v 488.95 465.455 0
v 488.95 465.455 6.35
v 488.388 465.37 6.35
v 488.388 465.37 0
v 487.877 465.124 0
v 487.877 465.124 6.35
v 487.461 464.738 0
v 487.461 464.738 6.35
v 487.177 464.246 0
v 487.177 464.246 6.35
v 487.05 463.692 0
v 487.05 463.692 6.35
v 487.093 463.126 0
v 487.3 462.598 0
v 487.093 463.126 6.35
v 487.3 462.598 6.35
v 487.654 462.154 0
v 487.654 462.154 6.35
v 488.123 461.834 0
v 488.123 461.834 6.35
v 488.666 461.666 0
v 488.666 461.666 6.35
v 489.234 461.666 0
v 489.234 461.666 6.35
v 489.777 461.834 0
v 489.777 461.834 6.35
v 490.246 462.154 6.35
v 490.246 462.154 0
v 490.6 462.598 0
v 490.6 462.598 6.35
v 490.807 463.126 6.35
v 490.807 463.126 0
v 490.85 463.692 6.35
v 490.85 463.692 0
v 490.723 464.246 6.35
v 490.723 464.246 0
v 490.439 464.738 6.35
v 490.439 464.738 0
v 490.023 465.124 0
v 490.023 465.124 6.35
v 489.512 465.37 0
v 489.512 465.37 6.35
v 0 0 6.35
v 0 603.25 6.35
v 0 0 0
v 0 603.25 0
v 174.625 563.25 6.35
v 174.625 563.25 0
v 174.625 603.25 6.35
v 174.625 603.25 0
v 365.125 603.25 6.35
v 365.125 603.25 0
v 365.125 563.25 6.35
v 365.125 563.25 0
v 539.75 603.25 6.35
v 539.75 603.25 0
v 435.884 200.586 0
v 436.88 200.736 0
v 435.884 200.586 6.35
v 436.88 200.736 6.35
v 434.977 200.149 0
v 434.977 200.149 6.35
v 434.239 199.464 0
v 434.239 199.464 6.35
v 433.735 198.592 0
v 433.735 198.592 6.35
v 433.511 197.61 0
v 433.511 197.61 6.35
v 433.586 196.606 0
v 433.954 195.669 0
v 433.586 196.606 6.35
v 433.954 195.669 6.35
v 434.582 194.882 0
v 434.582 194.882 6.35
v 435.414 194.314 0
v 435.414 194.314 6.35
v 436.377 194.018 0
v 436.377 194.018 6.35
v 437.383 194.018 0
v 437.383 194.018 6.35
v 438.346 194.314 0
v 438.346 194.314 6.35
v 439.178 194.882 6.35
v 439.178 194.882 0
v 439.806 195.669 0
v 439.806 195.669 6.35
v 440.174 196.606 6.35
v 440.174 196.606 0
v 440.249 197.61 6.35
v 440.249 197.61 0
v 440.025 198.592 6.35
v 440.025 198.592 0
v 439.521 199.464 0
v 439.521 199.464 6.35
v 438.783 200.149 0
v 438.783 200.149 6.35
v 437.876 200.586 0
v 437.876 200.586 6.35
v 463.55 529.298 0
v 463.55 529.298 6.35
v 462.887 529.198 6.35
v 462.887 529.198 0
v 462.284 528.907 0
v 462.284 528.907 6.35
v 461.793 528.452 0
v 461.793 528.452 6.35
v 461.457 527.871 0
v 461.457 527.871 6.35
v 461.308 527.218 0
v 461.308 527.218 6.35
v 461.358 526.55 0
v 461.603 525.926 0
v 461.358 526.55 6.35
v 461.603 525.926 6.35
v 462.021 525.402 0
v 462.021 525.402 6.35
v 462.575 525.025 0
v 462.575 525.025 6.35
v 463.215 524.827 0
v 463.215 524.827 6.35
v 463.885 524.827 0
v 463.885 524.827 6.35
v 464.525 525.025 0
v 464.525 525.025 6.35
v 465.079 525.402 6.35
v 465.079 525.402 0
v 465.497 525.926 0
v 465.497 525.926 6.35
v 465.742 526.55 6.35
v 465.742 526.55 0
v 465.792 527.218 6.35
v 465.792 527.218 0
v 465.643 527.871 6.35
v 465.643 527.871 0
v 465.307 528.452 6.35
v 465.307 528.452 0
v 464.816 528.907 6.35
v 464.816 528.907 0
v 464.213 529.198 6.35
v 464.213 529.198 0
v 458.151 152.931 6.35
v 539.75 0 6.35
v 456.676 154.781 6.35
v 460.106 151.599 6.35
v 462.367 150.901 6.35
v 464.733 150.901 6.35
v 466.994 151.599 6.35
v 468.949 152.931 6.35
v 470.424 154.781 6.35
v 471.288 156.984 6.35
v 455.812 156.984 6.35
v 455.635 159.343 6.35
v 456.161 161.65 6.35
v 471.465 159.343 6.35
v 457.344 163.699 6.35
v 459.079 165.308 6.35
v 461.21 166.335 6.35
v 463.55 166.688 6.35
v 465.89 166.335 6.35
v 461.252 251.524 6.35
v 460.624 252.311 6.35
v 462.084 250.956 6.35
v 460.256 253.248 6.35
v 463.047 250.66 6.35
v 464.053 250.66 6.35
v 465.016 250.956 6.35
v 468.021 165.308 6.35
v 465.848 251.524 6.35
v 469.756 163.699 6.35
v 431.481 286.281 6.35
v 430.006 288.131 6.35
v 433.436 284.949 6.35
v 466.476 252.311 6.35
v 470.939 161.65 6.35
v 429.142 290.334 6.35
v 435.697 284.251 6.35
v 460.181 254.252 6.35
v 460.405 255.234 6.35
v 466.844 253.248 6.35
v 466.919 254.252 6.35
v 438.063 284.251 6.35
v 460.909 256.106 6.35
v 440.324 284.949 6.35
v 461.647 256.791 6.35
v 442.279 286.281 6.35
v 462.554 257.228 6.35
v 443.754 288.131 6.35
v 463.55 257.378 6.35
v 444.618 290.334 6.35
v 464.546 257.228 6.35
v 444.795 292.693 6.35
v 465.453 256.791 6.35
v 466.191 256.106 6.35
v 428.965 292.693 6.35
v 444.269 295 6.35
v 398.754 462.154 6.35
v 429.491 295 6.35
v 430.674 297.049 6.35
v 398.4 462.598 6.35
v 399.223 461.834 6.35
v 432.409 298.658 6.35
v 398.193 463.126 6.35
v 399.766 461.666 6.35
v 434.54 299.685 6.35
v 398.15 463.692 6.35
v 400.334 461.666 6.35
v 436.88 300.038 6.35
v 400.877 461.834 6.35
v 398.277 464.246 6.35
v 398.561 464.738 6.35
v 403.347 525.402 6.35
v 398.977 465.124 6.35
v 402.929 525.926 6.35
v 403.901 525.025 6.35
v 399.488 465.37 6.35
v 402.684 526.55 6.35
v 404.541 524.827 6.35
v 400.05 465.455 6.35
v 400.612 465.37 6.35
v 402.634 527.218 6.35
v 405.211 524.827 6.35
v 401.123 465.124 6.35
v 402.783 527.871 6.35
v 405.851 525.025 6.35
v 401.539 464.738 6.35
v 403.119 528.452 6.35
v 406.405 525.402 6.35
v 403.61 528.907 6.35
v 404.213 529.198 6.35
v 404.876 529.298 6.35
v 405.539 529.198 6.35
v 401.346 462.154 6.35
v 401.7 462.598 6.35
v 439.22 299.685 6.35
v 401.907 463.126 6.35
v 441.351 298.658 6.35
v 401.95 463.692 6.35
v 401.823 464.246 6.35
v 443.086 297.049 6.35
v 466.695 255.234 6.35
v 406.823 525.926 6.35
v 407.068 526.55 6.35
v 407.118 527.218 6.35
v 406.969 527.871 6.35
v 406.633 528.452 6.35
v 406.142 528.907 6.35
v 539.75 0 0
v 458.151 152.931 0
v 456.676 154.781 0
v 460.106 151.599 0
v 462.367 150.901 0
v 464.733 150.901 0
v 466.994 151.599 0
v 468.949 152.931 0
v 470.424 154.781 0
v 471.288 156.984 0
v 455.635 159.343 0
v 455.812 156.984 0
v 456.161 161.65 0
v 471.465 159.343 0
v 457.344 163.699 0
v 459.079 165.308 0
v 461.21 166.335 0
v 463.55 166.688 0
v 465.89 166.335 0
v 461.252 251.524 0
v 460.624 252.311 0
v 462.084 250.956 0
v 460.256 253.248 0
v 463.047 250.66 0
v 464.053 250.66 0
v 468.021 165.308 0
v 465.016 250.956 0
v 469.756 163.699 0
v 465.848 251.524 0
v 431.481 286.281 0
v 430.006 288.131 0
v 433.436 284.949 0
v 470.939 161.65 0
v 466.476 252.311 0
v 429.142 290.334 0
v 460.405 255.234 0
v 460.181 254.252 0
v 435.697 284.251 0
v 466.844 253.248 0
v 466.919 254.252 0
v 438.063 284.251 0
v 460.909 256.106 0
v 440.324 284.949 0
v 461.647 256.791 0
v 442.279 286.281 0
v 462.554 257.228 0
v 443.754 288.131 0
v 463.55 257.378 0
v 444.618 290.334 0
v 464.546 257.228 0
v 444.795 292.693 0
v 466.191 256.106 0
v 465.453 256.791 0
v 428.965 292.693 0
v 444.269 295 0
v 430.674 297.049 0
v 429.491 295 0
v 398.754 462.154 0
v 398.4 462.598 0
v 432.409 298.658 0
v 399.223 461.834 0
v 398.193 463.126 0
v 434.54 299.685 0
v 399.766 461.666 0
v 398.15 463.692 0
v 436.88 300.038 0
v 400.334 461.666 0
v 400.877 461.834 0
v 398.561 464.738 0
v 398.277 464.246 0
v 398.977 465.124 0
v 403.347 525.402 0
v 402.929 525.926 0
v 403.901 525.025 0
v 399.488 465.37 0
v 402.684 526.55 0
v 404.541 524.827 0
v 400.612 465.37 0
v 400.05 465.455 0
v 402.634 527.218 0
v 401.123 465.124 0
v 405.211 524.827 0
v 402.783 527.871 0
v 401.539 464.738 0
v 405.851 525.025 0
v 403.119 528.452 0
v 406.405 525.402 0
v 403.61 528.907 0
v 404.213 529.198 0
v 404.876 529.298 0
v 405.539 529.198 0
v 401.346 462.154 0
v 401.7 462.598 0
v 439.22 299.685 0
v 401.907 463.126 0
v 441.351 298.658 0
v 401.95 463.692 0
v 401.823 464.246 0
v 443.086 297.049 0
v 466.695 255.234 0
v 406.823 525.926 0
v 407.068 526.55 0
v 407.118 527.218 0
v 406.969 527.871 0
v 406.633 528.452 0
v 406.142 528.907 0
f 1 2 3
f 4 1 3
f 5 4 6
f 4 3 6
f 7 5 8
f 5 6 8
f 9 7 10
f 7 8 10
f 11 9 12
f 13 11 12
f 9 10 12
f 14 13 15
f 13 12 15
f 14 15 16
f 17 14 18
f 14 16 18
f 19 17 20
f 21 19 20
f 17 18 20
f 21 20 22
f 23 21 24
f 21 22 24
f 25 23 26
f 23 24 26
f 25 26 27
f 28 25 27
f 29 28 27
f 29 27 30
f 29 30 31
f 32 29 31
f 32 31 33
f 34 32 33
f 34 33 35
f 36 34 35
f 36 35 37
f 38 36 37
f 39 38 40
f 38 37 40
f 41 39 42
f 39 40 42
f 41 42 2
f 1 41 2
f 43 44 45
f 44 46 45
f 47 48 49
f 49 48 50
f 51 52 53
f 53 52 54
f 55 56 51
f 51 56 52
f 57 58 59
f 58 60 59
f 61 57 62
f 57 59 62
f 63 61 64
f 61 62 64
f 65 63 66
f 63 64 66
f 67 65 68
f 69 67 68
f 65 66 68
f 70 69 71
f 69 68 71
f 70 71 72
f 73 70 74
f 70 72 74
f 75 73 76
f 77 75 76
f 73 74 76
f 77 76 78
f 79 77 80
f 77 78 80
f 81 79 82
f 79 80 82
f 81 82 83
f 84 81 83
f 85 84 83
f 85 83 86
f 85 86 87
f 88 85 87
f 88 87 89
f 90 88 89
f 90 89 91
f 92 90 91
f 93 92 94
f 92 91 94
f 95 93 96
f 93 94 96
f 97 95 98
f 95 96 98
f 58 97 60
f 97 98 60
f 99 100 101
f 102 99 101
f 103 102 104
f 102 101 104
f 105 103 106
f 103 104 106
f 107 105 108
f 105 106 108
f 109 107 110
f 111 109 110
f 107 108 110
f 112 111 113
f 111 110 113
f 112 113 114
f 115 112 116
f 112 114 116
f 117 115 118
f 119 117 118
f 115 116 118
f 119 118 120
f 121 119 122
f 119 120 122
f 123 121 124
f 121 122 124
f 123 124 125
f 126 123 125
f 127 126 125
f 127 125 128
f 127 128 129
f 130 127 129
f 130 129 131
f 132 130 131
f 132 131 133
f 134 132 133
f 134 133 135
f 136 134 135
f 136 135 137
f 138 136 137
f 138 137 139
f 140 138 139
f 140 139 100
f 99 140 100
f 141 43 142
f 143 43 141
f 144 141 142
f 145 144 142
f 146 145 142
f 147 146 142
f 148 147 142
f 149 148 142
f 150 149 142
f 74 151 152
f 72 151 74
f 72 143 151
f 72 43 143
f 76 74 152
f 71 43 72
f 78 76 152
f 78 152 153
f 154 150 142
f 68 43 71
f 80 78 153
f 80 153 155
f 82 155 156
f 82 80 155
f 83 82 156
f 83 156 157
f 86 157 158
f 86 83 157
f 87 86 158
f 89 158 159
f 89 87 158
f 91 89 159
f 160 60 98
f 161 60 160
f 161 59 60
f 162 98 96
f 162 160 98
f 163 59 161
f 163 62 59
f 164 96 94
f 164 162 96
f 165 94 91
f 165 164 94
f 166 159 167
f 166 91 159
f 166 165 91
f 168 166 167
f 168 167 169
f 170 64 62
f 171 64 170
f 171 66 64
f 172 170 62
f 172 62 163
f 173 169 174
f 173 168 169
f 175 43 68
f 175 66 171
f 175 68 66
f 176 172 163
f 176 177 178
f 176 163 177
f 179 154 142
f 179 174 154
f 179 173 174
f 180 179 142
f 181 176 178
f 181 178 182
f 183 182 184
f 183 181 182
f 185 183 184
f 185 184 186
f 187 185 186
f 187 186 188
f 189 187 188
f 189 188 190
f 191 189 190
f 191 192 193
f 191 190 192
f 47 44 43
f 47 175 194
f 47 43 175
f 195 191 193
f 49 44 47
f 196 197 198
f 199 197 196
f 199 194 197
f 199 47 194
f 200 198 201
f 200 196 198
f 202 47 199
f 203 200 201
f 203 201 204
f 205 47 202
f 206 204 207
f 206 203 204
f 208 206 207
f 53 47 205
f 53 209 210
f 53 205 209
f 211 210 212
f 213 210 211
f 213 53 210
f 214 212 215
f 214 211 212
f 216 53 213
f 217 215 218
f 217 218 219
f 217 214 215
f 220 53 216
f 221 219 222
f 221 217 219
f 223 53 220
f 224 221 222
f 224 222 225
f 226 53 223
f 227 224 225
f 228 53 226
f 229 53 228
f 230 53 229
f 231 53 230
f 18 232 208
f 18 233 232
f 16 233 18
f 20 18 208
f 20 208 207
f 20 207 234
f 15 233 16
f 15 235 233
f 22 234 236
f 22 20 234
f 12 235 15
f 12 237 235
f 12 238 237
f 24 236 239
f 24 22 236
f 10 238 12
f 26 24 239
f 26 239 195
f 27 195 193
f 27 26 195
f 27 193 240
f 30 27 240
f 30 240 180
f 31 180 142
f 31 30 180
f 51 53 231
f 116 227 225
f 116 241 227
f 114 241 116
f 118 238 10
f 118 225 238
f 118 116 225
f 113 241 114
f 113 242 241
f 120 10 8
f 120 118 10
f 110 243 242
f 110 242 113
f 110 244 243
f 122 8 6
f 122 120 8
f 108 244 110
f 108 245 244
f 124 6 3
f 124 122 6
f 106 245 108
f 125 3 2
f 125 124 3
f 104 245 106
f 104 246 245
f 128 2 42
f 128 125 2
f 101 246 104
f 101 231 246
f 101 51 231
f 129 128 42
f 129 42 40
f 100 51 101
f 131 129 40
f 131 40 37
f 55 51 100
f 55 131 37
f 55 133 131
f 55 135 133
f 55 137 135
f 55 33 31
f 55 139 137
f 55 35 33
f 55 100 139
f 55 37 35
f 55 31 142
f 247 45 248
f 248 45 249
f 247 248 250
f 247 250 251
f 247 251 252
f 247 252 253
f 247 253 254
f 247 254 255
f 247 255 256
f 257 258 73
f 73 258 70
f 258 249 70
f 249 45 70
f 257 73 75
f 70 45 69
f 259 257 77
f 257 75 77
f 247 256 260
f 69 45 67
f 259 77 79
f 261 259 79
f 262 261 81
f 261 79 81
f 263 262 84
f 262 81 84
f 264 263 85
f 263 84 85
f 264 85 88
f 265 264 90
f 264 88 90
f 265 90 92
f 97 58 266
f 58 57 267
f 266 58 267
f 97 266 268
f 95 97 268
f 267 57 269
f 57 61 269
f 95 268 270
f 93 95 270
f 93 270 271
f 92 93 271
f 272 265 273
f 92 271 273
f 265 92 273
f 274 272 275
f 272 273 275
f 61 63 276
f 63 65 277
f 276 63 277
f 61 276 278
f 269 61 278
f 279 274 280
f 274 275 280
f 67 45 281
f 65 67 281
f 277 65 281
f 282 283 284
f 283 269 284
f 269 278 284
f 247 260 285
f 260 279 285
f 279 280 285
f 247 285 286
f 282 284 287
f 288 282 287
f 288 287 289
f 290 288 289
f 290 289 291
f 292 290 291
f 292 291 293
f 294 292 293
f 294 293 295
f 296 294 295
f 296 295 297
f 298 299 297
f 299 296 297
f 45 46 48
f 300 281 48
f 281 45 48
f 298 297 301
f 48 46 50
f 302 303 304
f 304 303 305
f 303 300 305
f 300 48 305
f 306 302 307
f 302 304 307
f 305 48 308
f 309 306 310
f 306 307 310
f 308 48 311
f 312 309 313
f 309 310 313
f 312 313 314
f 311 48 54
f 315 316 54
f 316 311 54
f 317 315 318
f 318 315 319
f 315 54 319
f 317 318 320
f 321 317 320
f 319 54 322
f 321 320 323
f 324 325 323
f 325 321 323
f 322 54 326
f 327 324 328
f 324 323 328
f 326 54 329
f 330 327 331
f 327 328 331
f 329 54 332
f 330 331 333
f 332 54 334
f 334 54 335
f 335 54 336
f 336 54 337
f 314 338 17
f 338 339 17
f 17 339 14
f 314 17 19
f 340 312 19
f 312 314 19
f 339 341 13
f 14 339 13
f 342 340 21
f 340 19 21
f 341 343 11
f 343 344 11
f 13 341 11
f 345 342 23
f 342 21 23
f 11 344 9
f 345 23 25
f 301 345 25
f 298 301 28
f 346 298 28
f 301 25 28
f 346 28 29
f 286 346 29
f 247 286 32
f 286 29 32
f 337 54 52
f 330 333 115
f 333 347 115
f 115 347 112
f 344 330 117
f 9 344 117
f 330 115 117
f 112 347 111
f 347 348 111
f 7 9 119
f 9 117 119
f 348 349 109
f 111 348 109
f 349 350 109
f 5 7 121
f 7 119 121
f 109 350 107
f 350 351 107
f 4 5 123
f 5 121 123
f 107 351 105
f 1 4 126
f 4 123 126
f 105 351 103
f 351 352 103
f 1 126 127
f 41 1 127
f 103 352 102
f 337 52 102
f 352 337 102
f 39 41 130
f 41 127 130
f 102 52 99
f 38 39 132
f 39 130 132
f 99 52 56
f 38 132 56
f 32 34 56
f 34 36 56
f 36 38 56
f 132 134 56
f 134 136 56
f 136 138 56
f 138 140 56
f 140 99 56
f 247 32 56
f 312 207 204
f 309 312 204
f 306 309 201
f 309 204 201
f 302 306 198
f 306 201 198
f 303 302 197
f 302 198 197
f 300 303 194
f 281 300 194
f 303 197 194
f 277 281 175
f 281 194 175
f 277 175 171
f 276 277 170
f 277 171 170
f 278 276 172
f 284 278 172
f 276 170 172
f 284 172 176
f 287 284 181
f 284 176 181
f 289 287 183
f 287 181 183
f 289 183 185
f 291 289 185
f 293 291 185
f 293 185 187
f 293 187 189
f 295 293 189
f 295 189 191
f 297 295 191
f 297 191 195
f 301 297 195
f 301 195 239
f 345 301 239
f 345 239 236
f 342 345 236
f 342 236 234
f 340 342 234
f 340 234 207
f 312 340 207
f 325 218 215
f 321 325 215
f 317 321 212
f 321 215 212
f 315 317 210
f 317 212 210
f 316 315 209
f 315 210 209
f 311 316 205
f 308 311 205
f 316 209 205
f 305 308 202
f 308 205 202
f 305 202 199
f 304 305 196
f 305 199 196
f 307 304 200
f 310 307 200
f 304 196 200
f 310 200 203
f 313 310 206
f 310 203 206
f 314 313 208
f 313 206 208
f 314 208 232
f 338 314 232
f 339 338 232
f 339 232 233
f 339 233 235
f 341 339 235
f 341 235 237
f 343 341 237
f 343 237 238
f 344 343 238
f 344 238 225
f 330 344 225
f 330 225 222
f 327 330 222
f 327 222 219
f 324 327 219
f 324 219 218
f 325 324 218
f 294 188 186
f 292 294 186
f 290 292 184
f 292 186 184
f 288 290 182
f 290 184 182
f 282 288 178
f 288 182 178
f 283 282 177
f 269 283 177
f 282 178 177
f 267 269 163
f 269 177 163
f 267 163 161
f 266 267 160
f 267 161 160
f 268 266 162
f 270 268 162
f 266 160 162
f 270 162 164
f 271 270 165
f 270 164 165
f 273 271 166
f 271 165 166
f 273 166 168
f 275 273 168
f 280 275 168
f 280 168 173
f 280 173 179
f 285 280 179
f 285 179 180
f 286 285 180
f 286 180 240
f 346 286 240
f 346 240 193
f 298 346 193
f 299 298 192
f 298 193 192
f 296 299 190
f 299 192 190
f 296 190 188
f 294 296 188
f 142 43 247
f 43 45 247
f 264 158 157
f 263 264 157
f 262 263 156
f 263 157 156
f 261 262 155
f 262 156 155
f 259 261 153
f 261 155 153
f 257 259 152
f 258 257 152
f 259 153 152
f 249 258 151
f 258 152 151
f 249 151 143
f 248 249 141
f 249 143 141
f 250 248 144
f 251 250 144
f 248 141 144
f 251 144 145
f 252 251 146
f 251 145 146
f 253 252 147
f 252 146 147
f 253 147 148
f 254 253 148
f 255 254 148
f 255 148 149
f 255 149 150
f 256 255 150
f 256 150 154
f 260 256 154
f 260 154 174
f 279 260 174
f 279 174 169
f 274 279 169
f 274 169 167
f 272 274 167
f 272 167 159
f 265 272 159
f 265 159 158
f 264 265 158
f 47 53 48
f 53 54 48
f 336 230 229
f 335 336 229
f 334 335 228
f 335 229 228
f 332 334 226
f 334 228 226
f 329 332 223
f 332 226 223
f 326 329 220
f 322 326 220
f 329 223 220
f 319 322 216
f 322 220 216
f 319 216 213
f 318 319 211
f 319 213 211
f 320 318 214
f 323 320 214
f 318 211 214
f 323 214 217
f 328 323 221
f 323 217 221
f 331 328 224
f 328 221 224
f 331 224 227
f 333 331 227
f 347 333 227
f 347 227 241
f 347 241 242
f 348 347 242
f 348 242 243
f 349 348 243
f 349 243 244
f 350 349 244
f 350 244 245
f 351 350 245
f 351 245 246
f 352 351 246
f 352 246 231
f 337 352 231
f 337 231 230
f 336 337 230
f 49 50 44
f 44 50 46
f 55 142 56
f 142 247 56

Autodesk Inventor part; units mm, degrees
ref_plane "YZ Plane" through (0, 0, 0) normal (1, 0, 0) x (0, 1, 0)
ref_plane "XZ Plane" through (0, 0, 0) normal (0, 1, 0) x (-1, 0, 0)
ref_plane "XY Plane" through (0, 0, 0) normal (0, 0, 1) x (1, 0, 0)
sketch "Sketch1" plane through (0, 0, 0) normal (0, 0, 1) x (1, 0, 0)
  line L0 (0, 0) -> (539.75, 0)
  line L1 (539.75, 0) -> (539.75, 603.25)
  line L2 (539.75, 603.25) -> (0, 603.25)
  line L3 (0, 603.25) -> (0, 0)
  line L4 (174.625, 603.25) -> (365.125, 603.25)
  line L5 (365.125, 603.25) -> (365.125, 563.25)
  line L6 (365.125, 563.25) -> (174.625, 563.25)
  line L7 (174.625, 563.25) -> (174.625, 603.25)
  point P0 (269.875, 603.25)
  dimension "d0" = 603.25
  dimension "d1" = 539.75
  dimension "d4" = 40
  dimension "d5" = 190.5
extrude "Extrusion1" add sketch "Sketch1" along normal blind 6.35 contours L3 L2 L7 L6 L5 L1 L0
hole "Hole1" at (463.55, 527.05, 0) direction (0, 0, 1) diameter 4.4958 end through all clearance for "Flat Head Machine Screw (82)" size "#8" standard "Ansi Unified Screw Threads"
hole "Hole2" at (404.876, 527.05, 0) direction (0, 0, 1) diameter 4.4958 end through all clearance for "Flat Head Machine Screw (82)" size "#8" standard "Ansi Unified Screw Threads"
sketch "Sketch2" plane through (0, 0, 0) normal (0, 0, -1) x (-1, 0, 0)
  line L0 (-539.75, 603.25) -> (-365.125, 603.25) projected
  line L1 (-539.75, 0) -> (-539.75, 603.25) projected
  line L2 (-174.625, 563.25) -> (-365.125, 563.25) projected
  line L3 (-488.95, 463.55) -> (-400.05, 463.55)
  point P0 (-444.5, 463.55)
  dimension "d24" = 88.9
  dimension "d25" = 50.8
  dimension "d27" = 139.7
hole "Hole3" at (488.95, 463.55, 0) at (400.05, 463.55, 0) direction (0, 0, 1) diameter 3.81 end through all clearance for "Flat Head Machine Screw (82)" size "#6" standard "Ansi Unified Screw Threads"
hole "Hole4" at (463.55, 254, 0) direction (0, 0, 1) diameter 6.7564 end through all clearance for "Flat Head Machine Screw (82)" size "1/4" standard "Ansi Unified Screw Threads"
hole "Hole5" at (436.88, 197.358, 0) direction (0, 0, 1) diameter 6.7564 end through all clearance for "Flat Head Machine Screw (82)" size "1/4" standard "Ansi Unified Screw Threads"
sketch "Sketch3" plane through (0, 0, 0) normal (0, 0, -1) x (-1, 0, 0)
  circle A0 centre (-436.88, 197.358) radius 3.3782 projected
  circle A1 centre (-463.55, 254) radius 3.3782 projected
  point P0 (-436.88, 292.1)
  point P1 (-463.55, 158.75)
  dimension "d53" = 133.35
  dimension "d54" = 38.1
hole "Hole6" at (436.88, 292.1, 0) at (463.55, 158.75, 0) direction (0, 0, 1) diameter 15.875 end through all
properties part number "top plate" material "Polycarbonate, Clear"
